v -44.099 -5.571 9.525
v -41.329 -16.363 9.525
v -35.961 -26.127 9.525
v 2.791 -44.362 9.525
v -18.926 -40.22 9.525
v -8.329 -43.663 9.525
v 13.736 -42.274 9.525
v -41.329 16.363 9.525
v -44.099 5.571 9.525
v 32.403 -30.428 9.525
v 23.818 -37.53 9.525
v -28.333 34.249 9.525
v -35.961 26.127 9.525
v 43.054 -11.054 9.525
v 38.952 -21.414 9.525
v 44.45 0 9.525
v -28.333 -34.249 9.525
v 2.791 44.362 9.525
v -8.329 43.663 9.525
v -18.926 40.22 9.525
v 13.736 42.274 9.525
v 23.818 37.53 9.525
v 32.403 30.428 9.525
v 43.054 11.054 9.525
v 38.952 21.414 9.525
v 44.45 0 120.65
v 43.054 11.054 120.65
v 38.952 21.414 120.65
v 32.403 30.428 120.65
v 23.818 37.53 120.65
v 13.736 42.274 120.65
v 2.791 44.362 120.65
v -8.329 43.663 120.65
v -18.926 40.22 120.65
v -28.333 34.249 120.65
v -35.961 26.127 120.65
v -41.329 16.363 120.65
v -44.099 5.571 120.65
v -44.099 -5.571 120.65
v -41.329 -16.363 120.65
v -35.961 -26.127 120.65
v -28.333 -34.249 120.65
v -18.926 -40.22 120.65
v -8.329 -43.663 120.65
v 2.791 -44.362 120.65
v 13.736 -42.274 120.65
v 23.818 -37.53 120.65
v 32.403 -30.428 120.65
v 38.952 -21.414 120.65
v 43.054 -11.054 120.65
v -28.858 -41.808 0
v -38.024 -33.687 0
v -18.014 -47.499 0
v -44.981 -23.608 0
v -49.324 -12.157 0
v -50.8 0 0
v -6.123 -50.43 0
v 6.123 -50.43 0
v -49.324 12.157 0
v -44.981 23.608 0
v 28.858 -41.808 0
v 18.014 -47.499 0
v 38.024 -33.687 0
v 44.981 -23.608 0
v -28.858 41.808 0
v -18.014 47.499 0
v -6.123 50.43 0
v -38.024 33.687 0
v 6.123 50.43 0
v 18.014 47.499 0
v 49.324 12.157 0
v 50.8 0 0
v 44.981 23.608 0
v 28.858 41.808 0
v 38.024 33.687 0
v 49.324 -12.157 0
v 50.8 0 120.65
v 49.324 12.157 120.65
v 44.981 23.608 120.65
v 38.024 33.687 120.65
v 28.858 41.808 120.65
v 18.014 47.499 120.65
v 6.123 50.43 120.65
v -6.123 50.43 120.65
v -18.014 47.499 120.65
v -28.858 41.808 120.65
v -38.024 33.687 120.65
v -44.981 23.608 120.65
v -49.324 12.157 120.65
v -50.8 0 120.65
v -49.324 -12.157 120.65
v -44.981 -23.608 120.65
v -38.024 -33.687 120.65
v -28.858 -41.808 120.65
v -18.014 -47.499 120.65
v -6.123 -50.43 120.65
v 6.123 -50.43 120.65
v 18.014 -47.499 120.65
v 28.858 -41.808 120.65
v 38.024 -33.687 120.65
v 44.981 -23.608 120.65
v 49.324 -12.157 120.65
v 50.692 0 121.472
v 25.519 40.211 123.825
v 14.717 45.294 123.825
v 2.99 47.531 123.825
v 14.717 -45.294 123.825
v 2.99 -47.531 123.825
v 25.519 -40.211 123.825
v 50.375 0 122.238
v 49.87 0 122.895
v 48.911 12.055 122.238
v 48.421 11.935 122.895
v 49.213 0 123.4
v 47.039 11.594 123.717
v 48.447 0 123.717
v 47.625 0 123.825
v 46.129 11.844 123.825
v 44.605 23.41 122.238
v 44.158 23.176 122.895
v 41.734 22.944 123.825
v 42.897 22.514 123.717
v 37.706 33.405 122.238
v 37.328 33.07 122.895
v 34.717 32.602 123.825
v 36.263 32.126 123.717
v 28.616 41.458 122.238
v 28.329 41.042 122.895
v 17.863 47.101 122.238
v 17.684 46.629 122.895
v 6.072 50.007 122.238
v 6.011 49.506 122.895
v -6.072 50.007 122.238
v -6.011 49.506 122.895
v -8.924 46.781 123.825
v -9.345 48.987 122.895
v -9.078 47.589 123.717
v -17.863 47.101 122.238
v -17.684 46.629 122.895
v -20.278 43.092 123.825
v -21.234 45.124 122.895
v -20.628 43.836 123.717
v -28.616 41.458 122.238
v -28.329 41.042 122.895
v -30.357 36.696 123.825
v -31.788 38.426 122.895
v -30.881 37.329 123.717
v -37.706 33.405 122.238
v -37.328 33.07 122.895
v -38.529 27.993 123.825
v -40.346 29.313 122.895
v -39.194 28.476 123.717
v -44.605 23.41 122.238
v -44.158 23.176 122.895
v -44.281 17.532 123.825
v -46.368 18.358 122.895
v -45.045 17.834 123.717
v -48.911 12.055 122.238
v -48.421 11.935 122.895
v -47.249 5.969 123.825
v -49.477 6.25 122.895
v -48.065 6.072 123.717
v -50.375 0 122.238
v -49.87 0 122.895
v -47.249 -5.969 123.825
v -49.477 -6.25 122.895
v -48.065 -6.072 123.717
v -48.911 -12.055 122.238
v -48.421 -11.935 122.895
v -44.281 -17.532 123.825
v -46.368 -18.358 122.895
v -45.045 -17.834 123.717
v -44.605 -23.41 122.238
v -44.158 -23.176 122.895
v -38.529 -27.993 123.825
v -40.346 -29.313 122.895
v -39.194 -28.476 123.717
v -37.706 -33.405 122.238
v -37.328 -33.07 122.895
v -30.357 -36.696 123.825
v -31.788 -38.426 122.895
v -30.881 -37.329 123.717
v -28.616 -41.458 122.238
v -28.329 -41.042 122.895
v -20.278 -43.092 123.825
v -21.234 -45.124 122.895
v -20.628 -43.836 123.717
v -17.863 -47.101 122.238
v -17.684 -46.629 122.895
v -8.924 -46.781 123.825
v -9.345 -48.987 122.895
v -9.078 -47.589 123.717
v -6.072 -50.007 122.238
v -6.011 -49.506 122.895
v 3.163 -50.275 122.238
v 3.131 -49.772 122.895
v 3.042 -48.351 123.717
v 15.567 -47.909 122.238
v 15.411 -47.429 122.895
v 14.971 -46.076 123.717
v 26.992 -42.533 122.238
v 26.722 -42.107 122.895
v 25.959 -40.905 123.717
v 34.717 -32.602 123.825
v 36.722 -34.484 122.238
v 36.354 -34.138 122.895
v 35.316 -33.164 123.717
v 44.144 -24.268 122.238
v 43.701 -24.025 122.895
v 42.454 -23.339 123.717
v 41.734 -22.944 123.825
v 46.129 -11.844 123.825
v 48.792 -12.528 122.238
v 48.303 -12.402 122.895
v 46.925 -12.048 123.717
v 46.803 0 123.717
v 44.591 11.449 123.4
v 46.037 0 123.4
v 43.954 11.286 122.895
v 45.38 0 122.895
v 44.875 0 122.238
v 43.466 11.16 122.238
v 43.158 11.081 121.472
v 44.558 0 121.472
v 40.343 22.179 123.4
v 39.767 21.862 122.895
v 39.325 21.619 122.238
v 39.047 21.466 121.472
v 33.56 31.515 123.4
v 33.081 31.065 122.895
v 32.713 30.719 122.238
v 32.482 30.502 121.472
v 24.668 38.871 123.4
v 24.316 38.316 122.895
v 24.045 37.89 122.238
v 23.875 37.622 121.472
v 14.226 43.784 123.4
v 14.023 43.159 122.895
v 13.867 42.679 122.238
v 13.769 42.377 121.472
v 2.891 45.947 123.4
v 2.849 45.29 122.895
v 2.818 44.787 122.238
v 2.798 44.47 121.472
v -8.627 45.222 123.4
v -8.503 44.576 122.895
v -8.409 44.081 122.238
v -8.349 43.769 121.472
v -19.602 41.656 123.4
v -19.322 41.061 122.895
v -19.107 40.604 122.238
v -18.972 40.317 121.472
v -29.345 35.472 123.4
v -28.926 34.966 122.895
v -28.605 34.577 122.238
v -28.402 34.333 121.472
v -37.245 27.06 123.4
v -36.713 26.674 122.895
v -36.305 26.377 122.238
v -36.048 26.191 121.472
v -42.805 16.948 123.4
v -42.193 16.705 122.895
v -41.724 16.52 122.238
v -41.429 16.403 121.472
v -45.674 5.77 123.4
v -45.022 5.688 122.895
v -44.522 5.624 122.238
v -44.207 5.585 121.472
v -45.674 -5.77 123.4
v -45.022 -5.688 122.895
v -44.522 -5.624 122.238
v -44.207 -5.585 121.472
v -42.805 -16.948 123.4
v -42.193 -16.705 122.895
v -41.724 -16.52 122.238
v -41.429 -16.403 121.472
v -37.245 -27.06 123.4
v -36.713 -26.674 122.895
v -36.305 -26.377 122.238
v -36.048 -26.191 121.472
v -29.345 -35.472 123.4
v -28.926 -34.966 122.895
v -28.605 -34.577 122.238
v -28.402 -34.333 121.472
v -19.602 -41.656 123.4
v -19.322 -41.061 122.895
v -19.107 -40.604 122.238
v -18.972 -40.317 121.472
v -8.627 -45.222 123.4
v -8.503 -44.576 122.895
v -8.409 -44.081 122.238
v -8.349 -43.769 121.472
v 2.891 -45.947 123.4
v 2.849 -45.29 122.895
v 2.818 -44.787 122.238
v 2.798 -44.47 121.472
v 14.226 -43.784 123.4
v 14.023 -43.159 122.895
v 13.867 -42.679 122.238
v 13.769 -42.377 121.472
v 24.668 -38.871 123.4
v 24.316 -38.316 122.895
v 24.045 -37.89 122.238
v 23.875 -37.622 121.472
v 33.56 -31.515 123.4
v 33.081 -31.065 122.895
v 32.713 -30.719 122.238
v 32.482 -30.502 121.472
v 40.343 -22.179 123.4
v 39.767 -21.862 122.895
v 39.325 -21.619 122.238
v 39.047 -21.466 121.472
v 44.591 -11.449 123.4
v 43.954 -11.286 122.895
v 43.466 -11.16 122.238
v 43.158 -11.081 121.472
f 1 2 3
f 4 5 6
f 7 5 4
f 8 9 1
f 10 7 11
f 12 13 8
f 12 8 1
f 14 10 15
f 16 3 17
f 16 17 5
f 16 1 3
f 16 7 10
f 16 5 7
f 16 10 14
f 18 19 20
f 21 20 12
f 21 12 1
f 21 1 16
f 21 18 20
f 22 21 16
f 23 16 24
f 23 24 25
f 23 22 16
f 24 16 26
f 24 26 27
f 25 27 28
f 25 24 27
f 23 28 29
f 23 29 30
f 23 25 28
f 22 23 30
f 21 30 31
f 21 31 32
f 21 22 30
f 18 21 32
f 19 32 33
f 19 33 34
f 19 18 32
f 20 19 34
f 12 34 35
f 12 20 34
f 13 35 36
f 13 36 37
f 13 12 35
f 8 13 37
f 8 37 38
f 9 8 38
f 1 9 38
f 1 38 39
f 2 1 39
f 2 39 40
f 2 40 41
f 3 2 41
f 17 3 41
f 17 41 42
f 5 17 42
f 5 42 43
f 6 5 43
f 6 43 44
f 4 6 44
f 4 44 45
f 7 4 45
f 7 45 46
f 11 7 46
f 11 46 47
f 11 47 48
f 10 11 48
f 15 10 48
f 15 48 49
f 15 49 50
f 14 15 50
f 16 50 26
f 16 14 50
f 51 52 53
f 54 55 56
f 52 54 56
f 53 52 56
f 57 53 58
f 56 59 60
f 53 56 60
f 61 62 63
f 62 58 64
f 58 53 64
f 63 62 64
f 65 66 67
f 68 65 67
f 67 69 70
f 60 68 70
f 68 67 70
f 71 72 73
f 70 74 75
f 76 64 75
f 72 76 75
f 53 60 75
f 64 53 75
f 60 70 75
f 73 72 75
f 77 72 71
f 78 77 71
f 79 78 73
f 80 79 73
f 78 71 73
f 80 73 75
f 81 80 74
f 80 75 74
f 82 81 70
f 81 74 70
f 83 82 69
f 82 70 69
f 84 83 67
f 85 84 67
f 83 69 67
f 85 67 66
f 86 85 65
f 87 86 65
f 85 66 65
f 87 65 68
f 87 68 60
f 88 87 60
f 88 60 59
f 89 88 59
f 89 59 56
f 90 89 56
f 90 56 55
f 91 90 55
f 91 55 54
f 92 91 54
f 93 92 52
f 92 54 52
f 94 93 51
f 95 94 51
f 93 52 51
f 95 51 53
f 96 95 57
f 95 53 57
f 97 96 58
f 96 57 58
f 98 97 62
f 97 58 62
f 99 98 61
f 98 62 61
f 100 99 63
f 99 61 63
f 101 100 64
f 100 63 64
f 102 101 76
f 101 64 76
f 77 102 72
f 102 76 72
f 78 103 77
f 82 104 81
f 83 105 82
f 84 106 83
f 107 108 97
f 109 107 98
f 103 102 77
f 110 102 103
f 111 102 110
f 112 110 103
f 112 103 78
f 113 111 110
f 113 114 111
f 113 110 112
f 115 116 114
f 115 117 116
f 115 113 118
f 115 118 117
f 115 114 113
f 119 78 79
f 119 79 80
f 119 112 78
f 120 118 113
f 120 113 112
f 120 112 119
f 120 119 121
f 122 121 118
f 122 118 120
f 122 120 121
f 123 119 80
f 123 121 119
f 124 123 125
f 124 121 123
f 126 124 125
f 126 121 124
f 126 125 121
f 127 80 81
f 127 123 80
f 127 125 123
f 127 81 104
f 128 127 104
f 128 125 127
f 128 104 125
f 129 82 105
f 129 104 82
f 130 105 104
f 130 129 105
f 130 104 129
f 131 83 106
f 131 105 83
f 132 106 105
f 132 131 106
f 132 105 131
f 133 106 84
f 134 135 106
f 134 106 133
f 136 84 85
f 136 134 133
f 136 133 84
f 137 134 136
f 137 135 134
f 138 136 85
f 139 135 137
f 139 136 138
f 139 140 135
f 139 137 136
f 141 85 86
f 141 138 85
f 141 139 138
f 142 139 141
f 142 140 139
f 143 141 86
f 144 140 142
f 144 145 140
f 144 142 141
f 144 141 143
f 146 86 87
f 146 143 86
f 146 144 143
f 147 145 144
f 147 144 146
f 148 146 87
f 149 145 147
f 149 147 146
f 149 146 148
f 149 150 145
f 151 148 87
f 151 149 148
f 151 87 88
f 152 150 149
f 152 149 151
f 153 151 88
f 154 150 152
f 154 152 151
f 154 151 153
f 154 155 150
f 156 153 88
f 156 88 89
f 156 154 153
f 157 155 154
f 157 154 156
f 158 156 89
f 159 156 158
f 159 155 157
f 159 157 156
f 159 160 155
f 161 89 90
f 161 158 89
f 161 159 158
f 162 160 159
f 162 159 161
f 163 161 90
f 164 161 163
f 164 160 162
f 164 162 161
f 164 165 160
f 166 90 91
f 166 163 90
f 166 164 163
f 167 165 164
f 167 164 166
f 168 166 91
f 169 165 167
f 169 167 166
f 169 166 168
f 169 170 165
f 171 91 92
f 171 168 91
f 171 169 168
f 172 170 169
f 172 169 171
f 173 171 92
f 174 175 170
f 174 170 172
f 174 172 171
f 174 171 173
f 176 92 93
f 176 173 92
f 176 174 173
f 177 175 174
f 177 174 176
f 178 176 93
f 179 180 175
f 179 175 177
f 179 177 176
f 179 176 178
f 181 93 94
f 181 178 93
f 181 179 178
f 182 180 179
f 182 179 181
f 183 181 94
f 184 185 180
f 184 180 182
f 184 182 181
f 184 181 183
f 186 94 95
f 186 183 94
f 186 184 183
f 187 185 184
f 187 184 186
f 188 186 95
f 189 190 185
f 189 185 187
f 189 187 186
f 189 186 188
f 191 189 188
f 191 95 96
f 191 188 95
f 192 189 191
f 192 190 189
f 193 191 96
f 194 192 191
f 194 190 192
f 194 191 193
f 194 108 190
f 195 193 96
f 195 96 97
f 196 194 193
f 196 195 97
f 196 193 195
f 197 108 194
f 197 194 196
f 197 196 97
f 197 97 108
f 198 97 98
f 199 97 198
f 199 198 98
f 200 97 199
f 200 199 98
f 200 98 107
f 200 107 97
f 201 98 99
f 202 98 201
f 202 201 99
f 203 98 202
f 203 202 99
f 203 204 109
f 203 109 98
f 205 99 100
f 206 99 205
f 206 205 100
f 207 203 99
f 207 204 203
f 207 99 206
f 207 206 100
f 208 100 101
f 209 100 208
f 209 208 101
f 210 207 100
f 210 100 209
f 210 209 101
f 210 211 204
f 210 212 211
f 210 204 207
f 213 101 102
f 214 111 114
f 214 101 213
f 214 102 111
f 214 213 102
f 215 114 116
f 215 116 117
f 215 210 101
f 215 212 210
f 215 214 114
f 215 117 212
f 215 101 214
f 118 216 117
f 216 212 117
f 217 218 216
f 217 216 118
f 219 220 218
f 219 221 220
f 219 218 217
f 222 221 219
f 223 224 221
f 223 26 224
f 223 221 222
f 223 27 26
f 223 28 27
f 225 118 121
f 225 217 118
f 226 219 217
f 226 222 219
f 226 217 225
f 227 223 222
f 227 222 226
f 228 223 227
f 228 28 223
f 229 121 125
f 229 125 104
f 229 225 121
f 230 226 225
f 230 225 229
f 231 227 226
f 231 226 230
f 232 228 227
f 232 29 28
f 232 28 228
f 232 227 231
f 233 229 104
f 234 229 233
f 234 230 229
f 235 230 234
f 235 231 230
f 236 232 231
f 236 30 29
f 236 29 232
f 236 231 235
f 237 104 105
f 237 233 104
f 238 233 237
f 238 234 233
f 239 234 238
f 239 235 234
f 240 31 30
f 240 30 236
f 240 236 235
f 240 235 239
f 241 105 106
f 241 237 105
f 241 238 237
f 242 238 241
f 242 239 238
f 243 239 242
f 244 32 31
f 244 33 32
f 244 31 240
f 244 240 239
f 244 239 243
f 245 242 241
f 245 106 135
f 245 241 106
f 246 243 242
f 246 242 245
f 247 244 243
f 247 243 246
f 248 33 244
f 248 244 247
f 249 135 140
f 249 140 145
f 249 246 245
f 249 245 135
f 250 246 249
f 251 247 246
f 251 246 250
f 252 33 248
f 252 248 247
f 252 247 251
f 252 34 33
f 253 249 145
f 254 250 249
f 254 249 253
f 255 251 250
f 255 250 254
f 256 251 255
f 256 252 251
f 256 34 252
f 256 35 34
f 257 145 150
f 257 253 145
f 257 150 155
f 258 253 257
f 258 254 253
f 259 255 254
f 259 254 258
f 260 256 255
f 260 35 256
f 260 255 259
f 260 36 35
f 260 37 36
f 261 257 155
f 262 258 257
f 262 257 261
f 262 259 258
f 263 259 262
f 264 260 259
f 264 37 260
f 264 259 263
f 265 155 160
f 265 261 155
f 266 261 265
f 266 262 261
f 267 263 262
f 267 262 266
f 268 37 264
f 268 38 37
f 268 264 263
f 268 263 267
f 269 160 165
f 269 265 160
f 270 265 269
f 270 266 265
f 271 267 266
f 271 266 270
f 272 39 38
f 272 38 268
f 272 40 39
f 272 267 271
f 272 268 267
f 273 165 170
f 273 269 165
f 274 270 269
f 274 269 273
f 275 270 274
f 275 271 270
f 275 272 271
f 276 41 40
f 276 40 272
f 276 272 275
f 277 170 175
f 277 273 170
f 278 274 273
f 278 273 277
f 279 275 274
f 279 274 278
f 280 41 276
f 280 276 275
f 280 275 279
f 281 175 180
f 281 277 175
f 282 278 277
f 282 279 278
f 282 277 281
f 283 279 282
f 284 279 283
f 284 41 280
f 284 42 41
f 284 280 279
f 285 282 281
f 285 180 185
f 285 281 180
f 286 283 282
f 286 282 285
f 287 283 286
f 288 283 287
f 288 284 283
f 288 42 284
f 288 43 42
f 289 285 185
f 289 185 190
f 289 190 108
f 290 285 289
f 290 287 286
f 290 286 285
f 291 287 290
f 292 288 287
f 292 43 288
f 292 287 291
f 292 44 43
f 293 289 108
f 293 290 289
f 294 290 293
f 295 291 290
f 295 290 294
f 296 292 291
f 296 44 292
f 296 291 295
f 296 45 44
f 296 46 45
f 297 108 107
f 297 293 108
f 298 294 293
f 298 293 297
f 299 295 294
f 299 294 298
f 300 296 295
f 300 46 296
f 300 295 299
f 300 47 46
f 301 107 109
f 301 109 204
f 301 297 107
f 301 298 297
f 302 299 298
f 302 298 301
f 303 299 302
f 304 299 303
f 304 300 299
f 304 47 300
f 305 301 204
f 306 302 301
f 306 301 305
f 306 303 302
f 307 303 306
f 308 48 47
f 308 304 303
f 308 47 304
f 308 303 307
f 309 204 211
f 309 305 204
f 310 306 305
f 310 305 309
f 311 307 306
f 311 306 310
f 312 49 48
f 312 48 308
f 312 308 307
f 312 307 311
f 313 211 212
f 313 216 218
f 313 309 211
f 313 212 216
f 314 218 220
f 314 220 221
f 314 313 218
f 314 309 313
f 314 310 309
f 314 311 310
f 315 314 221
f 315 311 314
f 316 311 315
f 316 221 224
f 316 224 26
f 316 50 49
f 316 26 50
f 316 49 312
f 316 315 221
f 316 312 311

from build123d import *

# Parameters (mm, degrees)
F0_R     = 50.8
F0_R_2   = 44.45
F1_DEPTH = 123.825
F2_R     = 44.45
F3_DEPTH = 9.525
F4_R     = 3.17499


# Not quite as in the source:
# - a fillet or chamfer is up to 0.001 mm smaller than in the source, because OpenCascade refuses the exact size
# - a feature names something its author has since deleted; it is built from what else it names


with BuildPart() as f1:
    # F0 (on Top) → F1 (new body)
    with BuildSketch(Plane.XY):
        Circle(F0_R)
        Circle(F0_R_2, mode=Mode.SUBTRACT)
    extrude(amount=F1_DEPTH)

    # F2 (on Top) → F3 (join)
    with BuildSketch(Plane.XY):
        Circle(F2_R)
    extrude(amount=F3_DEPTH)

    # F4 (radius 3.175 in the source; OpenCascade refuses exactly that, so slightly less here)
    f4_edges = [f1.edges().sort_by_distance(p)[0] for p in [
        (-44.45, 0, 123.825),
        (-50.8, 0, 123.825),
    ]]
    fillet(f4_edges, radius=F4_R)


solid = f1.part
